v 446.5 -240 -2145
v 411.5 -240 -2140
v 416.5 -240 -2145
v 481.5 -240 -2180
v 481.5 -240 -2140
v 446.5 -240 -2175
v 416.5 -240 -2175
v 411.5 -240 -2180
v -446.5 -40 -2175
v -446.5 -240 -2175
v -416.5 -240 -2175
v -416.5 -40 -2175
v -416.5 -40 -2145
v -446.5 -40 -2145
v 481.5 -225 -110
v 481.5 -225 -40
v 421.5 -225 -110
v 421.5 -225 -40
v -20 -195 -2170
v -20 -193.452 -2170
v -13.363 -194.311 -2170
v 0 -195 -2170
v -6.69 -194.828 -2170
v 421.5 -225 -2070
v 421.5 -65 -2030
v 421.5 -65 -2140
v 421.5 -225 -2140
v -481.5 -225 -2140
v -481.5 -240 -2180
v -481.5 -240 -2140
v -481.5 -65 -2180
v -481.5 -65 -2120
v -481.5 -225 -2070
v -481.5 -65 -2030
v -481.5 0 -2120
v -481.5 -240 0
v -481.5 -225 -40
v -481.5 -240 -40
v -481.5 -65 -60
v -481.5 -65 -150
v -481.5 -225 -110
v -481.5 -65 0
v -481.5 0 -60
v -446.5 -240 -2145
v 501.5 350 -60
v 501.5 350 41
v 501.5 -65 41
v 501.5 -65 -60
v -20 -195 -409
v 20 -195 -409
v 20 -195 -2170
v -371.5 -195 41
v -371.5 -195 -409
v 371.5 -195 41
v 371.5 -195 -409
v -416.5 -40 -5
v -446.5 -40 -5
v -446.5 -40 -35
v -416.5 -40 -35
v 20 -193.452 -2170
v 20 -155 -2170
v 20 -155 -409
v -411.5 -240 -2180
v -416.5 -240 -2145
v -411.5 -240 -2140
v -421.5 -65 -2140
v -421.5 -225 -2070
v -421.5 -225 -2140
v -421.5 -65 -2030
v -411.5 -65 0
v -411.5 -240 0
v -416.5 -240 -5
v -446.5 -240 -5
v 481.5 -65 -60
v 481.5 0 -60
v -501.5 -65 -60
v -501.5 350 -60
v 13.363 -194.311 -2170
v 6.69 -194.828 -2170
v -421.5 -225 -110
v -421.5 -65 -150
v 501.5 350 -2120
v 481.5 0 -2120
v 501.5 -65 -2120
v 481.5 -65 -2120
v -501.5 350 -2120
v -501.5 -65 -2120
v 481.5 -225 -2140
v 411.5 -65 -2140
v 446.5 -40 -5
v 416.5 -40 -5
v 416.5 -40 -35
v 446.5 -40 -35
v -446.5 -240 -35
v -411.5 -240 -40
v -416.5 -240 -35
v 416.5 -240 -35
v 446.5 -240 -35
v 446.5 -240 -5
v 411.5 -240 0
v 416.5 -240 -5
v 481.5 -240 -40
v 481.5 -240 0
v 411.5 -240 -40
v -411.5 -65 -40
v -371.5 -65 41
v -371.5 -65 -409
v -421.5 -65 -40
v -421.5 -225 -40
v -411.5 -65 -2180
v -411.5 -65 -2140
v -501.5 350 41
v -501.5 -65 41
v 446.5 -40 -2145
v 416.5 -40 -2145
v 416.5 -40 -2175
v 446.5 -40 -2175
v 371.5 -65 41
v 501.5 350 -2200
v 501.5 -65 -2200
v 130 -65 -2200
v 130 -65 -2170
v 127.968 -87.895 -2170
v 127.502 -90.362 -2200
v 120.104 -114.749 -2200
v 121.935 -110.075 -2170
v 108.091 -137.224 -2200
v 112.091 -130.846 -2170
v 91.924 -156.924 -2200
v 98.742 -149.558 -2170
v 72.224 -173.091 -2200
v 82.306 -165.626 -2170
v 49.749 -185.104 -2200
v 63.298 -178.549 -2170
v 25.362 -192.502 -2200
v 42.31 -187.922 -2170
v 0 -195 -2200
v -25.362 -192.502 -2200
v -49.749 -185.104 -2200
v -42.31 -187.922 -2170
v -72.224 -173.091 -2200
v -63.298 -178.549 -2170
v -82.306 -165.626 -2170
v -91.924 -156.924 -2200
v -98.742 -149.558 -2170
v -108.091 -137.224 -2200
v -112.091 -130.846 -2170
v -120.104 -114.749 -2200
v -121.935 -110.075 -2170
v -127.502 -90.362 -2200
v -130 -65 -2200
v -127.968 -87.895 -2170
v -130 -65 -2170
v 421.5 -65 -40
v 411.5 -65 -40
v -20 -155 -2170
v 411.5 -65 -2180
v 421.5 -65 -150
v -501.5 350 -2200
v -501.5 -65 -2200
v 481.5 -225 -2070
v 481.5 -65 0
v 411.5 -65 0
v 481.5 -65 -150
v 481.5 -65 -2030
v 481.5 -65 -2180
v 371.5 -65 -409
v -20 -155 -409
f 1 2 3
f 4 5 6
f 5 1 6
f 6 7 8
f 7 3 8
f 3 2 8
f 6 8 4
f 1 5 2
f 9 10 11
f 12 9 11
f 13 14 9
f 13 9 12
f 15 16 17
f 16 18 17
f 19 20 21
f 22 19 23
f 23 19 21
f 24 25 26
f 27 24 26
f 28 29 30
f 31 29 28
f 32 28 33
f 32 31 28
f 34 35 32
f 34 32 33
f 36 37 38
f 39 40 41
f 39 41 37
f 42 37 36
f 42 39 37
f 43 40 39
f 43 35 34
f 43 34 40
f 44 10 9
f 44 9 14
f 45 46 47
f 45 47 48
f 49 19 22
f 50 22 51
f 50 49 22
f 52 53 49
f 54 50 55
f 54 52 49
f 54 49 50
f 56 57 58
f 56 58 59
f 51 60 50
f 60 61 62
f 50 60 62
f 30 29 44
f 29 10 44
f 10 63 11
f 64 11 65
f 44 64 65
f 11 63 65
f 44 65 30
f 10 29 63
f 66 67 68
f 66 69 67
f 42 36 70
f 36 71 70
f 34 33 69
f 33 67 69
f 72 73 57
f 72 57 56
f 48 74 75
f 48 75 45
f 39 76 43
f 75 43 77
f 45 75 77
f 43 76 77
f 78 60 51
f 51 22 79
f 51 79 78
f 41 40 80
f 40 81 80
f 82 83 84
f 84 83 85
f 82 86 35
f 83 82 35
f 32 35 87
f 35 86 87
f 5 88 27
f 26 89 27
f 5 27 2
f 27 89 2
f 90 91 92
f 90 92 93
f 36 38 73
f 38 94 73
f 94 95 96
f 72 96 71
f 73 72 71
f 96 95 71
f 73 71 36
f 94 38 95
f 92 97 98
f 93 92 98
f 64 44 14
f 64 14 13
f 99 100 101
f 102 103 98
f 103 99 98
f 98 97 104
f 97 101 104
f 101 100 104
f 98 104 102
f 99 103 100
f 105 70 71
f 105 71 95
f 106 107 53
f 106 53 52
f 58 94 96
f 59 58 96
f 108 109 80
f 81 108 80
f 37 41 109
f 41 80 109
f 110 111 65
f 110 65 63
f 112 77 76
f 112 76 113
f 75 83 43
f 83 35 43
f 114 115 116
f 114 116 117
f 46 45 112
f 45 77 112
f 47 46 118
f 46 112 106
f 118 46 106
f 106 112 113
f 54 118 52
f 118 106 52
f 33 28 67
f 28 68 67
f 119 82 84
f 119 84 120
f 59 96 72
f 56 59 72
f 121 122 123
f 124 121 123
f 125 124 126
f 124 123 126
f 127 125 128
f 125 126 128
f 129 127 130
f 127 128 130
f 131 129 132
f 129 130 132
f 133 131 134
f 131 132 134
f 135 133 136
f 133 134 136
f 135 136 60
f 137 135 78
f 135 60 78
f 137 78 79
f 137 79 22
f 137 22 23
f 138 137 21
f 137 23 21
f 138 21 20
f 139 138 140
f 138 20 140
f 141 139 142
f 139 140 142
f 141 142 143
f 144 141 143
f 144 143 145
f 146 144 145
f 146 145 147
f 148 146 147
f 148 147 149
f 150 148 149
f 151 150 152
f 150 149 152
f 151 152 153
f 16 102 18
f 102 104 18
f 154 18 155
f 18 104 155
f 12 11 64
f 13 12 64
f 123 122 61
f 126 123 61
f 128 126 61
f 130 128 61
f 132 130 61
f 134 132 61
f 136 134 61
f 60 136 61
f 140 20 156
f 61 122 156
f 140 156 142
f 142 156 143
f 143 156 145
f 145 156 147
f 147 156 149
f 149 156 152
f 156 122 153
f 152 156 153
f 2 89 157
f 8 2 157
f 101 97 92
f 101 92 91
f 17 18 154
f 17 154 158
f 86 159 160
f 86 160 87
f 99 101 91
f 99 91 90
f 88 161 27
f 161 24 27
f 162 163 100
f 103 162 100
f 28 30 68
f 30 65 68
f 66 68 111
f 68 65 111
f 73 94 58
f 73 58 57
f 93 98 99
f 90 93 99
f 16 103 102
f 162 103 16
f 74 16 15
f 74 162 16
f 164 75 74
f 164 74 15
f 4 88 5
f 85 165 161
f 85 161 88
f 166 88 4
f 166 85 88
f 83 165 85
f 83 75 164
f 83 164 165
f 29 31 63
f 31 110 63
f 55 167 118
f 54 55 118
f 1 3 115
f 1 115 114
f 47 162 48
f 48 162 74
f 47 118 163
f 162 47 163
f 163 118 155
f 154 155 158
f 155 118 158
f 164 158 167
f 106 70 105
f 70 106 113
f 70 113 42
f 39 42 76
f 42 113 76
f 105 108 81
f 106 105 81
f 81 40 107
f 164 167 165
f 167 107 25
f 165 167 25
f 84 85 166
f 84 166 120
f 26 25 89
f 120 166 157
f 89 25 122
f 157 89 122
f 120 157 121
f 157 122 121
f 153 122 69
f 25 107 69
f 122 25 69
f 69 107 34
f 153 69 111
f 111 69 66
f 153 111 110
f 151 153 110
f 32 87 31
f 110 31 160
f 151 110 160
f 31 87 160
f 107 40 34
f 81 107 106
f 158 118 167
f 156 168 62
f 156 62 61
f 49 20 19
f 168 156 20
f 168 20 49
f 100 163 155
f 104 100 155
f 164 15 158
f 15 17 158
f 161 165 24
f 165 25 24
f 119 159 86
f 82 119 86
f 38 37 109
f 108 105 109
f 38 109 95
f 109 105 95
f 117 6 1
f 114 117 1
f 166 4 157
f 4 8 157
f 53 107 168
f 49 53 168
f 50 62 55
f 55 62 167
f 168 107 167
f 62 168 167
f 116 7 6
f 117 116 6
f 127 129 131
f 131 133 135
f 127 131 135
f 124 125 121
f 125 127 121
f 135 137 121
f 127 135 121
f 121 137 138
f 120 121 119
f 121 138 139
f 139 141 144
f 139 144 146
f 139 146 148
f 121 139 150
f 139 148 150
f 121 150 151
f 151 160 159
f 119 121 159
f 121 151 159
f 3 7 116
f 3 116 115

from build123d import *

# Parameters (mm, degrees)
BOSS_EXTRUDE1_DEPTH      = 65
BOSS_EXTRUDE2_DEPTH      = 350
BOSS_EXTRUDE2_DEPTH_BACK = 50
SKETCH1_3_W              = 943
SKETCH1_3_H              = 80
SKETCH1_3_H_2            = 101
SKETCH1_4_W              = 40
SKETCH1_4_H              = 40
BOSS_EXTRUDE3_DEPTH      = 240
BOSS_EXTRUDE4_DEPTH      = 30
BOSS_EXTRUDE5_DEPTH      = 30
SKETCH5_W                = 30
SKETCH5_H                = 30
CUT_EXTRUDE1_DEPTH       = 200
BOSS_EXTRUDE6_DEPTH      = 30
BOSS_EXTRUDE7_START      = -30
BOSS_EXTRUDE7_DEPTH      = 30
BOSS_EXTRUDE8_DEPTH      = 20
BOSS_EXTRUDE8_DEPTH_BACK = 20
SKETCH8_W                = 743
SKETCH8_H                = 450
BOSS_EXTRUDE9_DEPTH      = 130
BOSS_EXTRUDE14_DEPTH     = 30
BOSS_EXTRUDE15_DEPTH     = 30
BOSS_EXTRUDE16_DEPTH     = 30
BOSS_EXTRUDE17_DEPTH     = 30
BOSS_EXTRUDE18_DEPTH     = 30
BOSS_EXTRUDE19_DEPTH     = 30


with BuildPart() as part:
    # Sketch1 → Boss-Extrude1 (new body)
    with BuildSketch(Plane(origin=(0, 0, 0), x_dir=(1, 0, 0), z_dir=(0, 1, 0))):
        Polygon((-451.5, 60), (-471.5, 60), (-471.5, -41), (471.5, -41), (471.5, 60), (451.5, 60), (451.5, 2120), (471.5, 2120), (471.5, 2200), (-471.5, 2200), (-471.5, 2120), (-451.5, 2120), align=None)
    extrude(amount=-BOSS_EXTRUDE1_DEPTH)

    # Sketch1<3> → Boss-Extrude2 (add, two sides: drawn at the far end of the back side and taken through both)
    with BuildSketch(Plane(origin=(0, 0, 0), x_dir=(1, 0, 0), z_dir=(0, 1, 0)).offset(-BOSS_EXTRUDE2_DEPTH_BACK)):
        with Locations((0, 2160)):
            Rectangle(SKETCH1_3_W, SKETCH1_3_H)
        with Locations((0, 9.5)):
            Rectangle(SKETCH1_3_W, SKETCH1_3_H_2)
    extrude(amount=BOSS_EXTRUDE2_DEPTH + BOSS_EXTRUDE2_DEPTH_BACK)

    # Sketch1<4> → Boss-Extrude3 (add)
    with BuildSketch(Plane(origin=(0, 0, 0), x_dir=(1, 0, 0), z_dir=(0, 1, 0))):
        with Locations((-431.5, 20)):
            Rectangle(SKETCH1_4_W, SKETCH1_4_H)
        with Locations((431.5, 20)):
            Rectangle(SKETCH1_4_W, SKETCH1_4_H)
        with Locations((-431.5, 2160)):
            Rectangle(SKETCH1_4_W, SKETCH1_4_H)
        with Locations((431.5, 2160)):
            Rectangle(SKETCH1_4_W, SKETCH1_4_H)
    extrude(amount=-BOSS_EXTRUDE3_DEPTH)

    # Sketch3 → Boss-Extrude4 (add)
    with BuildSketch(Plane(origin=(451.5, 0, 0), x_dir=(0, 0, -1), z_dir=(1, 0, 0))):
        Polygon((40, -65), (40, -225), (110, -225), (150, -65), align=None)
        Polygon((2140, -65), (2030, -65), (2070, -225), (2140, -225), align=None)
    extrude(amount=-BOSS_EXTRUDE4_DEPTH)

    # Sketch4 → Boss-Extrude5 (add)
    with BuildSketch(Plane(origin=(-451.5, 0, -45.75), x_dir=(0, 0, -1), z_dir=(1, 0, 0))):
        Polygon((2024.25, -225), (2094.25, -225), (2094.25, -65), (1984.25, -65), align=None)
        Polygon((64.25, -225), (104.25, -65), (-5.75, -65), (-5.75, -225), align=None)
    extrude(amount=BOSS_EXTRUDE5_DEPTH)

    # Sketch5 → Cut-Extrude1 (cut)
    with BuildSketch(Plane.XZ.offset(240)):
        with Locations((-431.5, -2160)):
            Rectangle(SKETCH5_W, SKETCH5_H)
        with Locations((431.5, -2160)):
            Rectangle(SKETCH5_W, SKETCH5_H)
        with Locations((431.5, -20)):
            Rectangle(SKETCH5_W, SKETCH5_H)
        with Locations((-431.5, -20)):
            Rectangle(SKETCH5_W, SKETCH5_H)
    extrude(amount=-CUT_EXTRUDE1_DEPTH, mode=Mode.SUBTRACT)

    # Sketch6 → Boss-Extrude6 (add)
    with BuildSketch(Plane.XY.offset(41)):
        with BuildLine():
            Line((130, -65), (-130, -65))
            ThreePointArc((-130, -65), (0, -195), (130, -65))
        make_face()
    extrude(amount=-BOSS_EXTRUDE6_DEPTH)

    # Sketch7 → Boss-Extrude7 (add)
    with BuildSketch(Plane(origin=(0, 0, -2200), x_dir=(-1, 0, 0), z_dir=(0, 0, -1)).offset(BOSS_EXTRUDE7_START)):
        with BuildLine():
            Line((130, -65), (-130, -65))
            ThreePointArc((-130, -65), (0, -195), (130, -65))
        make_face()
    extrude(amount=BOSS_EXTRUDE7_DEPTH)

    # 3DSketch1 → Boss-Extrude8 (add, two sides: drawn at the far end of the back side and taken through both)
    with BuildSketch(Plane(origin=(0, -195, 11), x_dir=(0, 0.018337127203073178, -0.9998318607475651), z_dir=(1, 0, 0)).offset(-BOSS_EXTRUDE8_DEPTH_BACK)):
        Polygon((0, 0), (0.733485088, 39.99327443), (2181.366773379, 0), (2180.63328829, -39.99327443), align=None)
    extrude(amount=BOSS_EXTRUDE8_DEPTH + BOSS_EXTRUDE8_DEPTH_BACK)

    # Sketch8 → Boss-Extrude9 (add)
    with BuildSketch(Plane.XZ.offset(65)):
        with Locations((0, -184)):
            Rectangle(SKETCH8_W, SKETCH8_H)
    extrude(amount=BOSS_EXTRUDE9_DEPTH)

    # Sketch12 → Boss-Extrude14 (add)
    with BuildSketch(Plane.ZY.offset(451.5)):
        Polygon((-60, 0), (-2120, 0), (-2120, -65), (-2180, -65), (-2180, -240), (-2140, -240), (-2140, -225), (-2070, -225), (-2030, -65), (-150, -65), (-110, -225), (-40, -225), (-40, -240), (0, -240), (0, -65), (-60, -65), align=None)
    extrude(amount=BOSS_EXTRUDE14_DEPTH)

    # Sketch13 → Boss-Extrude15 (add)
    with BuildSketch(Plane(origin=(451.5, 0, 0), x_dir=(0, 0, -1), z_dir=(1, 0, 0))):
        Polygon((2120, 0), (60, 0), (60, -65), (0, -65), (0, -240), (40, -240), (40, -225), (110, -225), (150, -65), (2030, -65), (2070, -225), (2140, -225), (2140, -240), (2180, -240), (2180, -65), (2120, -65), align=None)
    extrude(amount=BOSS_EXTRUDE15_DEPTH)

    # Sketch14 → Boss-Extrude16 (add)
    with BuildSketch(Plane.ZY.offset(471.5)):
        Polygon((-2120, 350), (-2200, 350), (-2200, -65), (-2180, -65), (-2120, -65), (-2120, 0), align=None)
    extrude(amount=BOSS_EXTRUDE16_DEPTH)

    # Sketch15 → Boss-Extrude17 (add)
    with BuildSketch(Plane.ZY.offset(471.5)):
        Polygon((41, -65), (41, 350), (-60, 350), (-60, 0), (-60, -65), (0, -65), align=None)
    extrude(amount=BOSS_EXTRUDE17_DEPTH)

    # Sketch16 → Boss-Extrude18 (add)
    with BuildSketch(Plane(origin=(471.5, 0, 0), x_dir=(0, 0, -1), z_dir=(1, 0, 0))):
        Polygon((2200, 350), (2120, 350), (2120, 0), (2120, -65), (2180, -65), (2200, -65), align=None)
    extrude(amount=BOSS_EXTRUDE18_DEPTH)

    # Sketch17 → Boss-Extrude19 (add)
    with BuildSketch(Plane(origin=(471.5, 0, 0), x_dir=(0, 0, -1), z_dir=(1, 0, 0))):
        Polygon((60, -65), (60, 0), (60, 350), (-41, 350), (-41, -65), (0, -65), align=None)
    extrude(amount=BOSS_EXTRUDE19_DEPTH)


solid = part.part
